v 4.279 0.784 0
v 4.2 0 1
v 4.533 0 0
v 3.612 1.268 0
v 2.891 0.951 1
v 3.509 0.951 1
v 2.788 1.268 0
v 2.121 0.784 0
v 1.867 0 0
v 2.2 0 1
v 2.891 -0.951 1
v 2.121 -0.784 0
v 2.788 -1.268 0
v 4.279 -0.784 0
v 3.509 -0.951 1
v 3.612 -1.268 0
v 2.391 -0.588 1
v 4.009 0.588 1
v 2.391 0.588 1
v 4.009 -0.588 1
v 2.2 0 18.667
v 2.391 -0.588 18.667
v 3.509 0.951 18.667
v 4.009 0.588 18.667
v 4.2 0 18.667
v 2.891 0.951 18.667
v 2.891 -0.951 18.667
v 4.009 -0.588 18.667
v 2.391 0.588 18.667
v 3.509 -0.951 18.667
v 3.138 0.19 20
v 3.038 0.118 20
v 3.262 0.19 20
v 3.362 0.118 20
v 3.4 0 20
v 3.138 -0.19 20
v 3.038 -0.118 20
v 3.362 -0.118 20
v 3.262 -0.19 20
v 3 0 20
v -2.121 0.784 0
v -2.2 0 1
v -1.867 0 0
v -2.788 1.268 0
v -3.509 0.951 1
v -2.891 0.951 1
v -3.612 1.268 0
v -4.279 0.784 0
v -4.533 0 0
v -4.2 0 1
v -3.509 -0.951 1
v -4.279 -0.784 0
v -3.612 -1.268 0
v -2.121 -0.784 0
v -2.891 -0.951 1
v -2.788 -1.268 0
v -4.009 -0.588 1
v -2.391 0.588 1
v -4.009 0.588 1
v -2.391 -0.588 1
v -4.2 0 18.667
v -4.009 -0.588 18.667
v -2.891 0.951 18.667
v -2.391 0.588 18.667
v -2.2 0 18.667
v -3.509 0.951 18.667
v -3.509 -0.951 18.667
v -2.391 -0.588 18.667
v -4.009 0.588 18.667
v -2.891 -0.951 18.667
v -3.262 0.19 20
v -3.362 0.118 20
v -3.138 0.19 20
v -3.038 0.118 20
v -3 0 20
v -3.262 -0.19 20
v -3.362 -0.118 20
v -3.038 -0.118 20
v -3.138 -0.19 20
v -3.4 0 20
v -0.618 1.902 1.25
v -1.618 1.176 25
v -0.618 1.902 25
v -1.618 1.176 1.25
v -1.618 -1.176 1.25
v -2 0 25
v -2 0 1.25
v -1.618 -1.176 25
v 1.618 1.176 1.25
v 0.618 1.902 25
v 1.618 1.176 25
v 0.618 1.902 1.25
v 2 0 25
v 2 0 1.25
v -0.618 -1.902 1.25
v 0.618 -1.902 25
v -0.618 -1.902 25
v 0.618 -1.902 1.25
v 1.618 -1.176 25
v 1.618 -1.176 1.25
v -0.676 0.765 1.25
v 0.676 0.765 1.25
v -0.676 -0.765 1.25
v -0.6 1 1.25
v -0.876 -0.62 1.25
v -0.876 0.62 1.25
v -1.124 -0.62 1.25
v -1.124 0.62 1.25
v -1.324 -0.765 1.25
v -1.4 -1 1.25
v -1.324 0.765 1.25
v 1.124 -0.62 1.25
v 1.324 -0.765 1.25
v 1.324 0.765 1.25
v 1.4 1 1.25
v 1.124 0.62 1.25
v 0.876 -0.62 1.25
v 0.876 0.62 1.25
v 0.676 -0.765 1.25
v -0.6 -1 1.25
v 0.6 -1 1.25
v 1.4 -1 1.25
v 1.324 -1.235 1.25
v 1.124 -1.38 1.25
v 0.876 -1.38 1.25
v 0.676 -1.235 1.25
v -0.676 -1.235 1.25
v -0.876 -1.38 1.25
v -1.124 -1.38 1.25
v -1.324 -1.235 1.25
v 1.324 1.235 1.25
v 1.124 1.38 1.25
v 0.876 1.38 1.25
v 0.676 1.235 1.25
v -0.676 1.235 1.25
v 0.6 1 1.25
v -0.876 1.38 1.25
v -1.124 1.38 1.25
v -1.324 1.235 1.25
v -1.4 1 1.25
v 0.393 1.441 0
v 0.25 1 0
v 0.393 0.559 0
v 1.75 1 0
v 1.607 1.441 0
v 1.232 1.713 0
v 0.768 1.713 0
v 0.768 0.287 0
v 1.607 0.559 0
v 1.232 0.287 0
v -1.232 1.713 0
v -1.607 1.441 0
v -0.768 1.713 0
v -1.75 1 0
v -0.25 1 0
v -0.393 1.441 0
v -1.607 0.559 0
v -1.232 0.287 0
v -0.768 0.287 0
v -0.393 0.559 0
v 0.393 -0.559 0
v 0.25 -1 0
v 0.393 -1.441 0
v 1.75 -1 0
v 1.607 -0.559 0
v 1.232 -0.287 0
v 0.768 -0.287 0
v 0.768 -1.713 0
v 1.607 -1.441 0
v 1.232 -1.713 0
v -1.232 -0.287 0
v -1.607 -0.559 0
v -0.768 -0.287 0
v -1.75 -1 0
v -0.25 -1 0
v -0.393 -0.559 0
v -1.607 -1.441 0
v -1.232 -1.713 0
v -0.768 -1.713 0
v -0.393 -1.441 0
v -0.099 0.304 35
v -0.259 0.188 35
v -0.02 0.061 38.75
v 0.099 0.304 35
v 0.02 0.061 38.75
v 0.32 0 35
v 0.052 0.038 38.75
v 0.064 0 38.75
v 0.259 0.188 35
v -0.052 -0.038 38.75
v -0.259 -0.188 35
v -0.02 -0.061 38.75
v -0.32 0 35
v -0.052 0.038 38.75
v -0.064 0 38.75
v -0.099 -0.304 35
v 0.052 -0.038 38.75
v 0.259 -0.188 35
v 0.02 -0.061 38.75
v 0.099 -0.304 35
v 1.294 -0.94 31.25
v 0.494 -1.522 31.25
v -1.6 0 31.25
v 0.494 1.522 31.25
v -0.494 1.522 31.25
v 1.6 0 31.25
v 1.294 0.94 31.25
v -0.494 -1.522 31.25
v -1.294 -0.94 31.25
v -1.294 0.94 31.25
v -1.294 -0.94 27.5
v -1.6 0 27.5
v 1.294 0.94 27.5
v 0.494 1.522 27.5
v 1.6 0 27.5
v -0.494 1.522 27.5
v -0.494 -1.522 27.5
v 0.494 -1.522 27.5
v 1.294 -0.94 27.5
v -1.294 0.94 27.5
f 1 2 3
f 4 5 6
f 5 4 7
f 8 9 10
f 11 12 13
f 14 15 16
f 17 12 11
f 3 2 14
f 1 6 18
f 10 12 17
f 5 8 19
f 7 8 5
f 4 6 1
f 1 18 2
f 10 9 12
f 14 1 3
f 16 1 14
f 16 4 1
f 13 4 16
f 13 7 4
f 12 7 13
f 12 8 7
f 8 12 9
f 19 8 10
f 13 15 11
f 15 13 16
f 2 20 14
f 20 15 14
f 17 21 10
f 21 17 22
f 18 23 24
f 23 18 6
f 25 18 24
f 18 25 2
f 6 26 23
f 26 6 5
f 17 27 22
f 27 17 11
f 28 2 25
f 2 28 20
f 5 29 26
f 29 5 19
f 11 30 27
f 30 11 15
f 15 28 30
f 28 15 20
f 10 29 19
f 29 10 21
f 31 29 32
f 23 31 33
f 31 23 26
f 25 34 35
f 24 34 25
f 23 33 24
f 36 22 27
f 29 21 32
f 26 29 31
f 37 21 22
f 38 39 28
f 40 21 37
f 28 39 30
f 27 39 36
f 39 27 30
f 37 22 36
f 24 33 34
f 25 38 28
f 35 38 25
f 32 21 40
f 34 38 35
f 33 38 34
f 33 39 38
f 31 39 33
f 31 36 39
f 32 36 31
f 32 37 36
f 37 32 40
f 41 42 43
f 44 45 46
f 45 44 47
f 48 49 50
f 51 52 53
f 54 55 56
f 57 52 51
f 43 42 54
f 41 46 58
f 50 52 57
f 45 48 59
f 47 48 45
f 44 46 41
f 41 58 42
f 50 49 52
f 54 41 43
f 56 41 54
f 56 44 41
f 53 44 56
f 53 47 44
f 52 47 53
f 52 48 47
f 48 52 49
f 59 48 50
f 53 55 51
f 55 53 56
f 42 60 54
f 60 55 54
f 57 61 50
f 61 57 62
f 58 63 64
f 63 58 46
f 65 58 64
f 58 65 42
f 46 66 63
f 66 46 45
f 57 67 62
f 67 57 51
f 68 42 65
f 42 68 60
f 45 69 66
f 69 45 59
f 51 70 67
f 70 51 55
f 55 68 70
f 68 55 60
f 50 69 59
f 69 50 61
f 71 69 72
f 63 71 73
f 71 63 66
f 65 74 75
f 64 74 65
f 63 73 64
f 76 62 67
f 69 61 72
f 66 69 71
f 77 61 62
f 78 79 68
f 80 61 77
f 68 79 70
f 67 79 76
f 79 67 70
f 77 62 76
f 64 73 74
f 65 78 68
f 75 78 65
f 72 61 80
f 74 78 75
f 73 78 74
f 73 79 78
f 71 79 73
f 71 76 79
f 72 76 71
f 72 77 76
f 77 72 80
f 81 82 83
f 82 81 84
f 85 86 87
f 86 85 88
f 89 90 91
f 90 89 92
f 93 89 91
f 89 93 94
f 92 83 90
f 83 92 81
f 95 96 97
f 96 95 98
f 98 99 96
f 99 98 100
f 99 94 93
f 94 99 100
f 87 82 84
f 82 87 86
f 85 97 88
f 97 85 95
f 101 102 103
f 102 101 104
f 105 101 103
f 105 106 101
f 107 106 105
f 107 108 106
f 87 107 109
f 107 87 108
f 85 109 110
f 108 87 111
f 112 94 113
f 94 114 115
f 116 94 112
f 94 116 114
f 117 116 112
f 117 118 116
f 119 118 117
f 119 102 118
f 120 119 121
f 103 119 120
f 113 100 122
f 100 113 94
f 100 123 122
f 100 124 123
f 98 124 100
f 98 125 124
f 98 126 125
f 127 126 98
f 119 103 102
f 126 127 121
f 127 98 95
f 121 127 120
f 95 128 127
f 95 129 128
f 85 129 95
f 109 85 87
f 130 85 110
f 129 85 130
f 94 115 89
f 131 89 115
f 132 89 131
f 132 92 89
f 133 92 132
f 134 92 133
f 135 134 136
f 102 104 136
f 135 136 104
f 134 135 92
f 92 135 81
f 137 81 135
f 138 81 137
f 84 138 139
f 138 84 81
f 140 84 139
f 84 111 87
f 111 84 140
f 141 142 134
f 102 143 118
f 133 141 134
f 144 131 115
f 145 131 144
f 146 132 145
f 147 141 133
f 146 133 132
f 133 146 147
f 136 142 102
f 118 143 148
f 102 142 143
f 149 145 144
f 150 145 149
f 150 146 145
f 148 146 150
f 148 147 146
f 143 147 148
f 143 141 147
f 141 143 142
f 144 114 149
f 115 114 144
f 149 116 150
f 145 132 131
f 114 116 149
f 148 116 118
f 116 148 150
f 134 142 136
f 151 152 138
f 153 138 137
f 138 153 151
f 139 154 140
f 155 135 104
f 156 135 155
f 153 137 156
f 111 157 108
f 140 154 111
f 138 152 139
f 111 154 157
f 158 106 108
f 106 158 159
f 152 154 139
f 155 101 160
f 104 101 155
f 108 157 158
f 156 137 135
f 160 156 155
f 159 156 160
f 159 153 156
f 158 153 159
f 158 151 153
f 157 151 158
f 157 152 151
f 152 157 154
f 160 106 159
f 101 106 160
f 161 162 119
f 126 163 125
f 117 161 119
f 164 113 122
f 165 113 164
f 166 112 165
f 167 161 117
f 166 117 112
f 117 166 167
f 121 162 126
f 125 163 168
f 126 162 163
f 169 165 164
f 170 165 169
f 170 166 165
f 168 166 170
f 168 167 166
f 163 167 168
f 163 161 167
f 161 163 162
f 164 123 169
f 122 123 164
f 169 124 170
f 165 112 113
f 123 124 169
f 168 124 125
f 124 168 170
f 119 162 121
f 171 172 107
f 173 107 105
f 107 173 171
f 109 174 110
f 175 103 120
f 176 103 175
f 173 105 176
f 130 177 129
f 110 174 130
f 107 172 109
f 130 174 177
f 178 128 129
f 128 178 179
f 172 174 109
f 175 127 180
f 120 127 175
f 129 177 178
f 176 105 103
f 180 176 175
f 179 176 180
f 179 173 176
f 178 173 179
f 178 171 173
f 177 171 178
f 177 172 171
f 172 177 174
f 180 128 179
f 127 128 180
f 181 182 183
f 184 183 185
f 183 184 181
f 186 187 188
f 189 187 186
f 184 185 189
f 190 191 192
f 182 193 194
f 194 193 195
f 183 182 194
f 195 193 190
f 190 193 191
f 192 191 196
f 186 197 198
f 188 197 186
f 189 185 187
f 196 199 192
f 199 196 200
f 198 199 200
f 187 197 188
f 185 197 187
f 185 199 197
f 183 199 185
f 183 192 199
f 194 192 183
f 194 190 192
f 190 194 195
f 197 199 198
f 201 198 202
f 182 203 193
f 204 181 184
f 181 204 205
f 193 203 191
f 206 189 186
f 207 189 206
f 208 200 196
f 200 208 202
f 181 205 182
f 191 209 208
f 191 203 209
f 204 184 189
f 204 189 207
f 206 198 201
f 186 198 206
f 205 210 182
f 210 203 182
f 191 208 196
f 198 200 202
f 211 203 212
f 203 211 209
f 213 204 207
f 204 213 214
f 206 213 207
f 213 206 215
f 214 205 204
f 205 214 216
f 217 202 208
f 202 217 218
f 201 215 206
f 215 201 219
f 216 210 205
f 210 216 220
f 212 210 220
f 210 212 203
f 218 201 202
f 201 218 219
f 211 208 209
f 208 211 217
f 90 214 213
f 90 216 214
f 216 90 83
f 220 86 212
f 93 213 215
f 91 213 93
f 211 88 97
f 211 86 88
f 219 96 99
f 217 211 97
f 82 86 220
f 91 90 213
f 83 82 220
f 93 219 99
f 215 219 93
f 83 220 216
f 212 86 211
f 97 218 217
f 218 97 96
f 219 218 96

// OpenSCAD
$fn = 10;

room_size_x = 80;
room_size_y = 80;
room_size_z = 80;
module room(){
union(){
translate([-room_size_x,0,0])
cube([room_size_x,1,room_size_z]);
translate([0,-room_size_y,0])
cube([1,room_size_y,room_size_z]);
translate([-room_size_x,-room_size_y,0])
cube([room_size_x,room_size_y,1]);
}
}

module booster(h, r) {
// cone + tube + cone
 booster_bottom_h = h/20;
 booster_pointy_h = h/15;
 tube_h = h - booster_bottom_h - booster_pointy_h;
 
 union(){
 color("grey")
 cylinder(booster_bottom_h,r+r/3,r); 
 
 color("white") 
 translate([0,0,booster_bottom_h])
 cylinder(tube_h,r,r);
 
 color("white")
 translate([0,0,booster_bottom_h+tube_h])
 cylinder(booster_pointy_h, r, r*0.2);
 }
};

module core_orion_connector(h, r1, r2){
   color("darkorange")
   cylinder(h, r1, r2);
}

module core_stage(h, r) {
 // motors + fuel cylinder
 motors_h = h/20;
 pre_motors_h = h/10;
 core_tube_h = h - motors_h - pre_motors_h;
 
 translate([0,0,motors_h])
 union(){
 translate([0,0,pre_motors_h]){
 color("orange")
 cylinder(core_tube_h,r,r);
 }
 color("white")
 cylinder(pre_motors_h, r,r);
 }
 
 // 4x engines
 union(){
 translate([r/2,r/2,0])
 rs_25_engine(motors_h, r/5);
  translate([-r/2,r/2,0])
 rs_25_engine(motors_h, r/5);
  translate([r/2,-r/2,0])
 rs_25_engine(motors_h, r/5);
  translate([-r/2,-r/2,0])
 rs_25_engine(motors_h, r/5);
 }
};

module rs_25_engine(h,r) {
   color([0.2,0.2,0.2])
   cylinder(h,r+0.35,r);
};

module orion(h,r1,r2) {
  orion_conn_h = h*0.5;
  orion_base_h = h - orion_conn_h;
  
  color("white")
  union(){
    translate([0,0,orion_base_h+orion_conn_h])
    cylinder(orion_conn_h, r2,r2*0.2);
    translate([0,0,orion_base_h])
    cylinder(orion_conn_h, r1,r2);
    cylinder(orion_base_h,r1,r1);
  }
};

core_h=25;
core_r = 2;

core_orion_h = core_h * 0.1;
core_orion_r1 = core_r;
core_orion_r2 = core_r*0.8;

orion_h = core_h*0.3;
orion_r1 = core_orion_r2;
orion_r2 = core_orion_r2*0.2;

union(){
translate([3.2,0,0])
booster(20,1);

translate([-3.2,0,0])
booster(20,1);

core_stage(core_h,core_r);

translate([0,0,core_h])
core_orion_connector(core_orion_h,core_orion_r1, core_orion_r2);

translate([0,0,core_h + core_orion_h])
orion(orion_h, orion_r1, orion_r2);
}

//color("lightyellow")
//cube([1000,1000,1]);
